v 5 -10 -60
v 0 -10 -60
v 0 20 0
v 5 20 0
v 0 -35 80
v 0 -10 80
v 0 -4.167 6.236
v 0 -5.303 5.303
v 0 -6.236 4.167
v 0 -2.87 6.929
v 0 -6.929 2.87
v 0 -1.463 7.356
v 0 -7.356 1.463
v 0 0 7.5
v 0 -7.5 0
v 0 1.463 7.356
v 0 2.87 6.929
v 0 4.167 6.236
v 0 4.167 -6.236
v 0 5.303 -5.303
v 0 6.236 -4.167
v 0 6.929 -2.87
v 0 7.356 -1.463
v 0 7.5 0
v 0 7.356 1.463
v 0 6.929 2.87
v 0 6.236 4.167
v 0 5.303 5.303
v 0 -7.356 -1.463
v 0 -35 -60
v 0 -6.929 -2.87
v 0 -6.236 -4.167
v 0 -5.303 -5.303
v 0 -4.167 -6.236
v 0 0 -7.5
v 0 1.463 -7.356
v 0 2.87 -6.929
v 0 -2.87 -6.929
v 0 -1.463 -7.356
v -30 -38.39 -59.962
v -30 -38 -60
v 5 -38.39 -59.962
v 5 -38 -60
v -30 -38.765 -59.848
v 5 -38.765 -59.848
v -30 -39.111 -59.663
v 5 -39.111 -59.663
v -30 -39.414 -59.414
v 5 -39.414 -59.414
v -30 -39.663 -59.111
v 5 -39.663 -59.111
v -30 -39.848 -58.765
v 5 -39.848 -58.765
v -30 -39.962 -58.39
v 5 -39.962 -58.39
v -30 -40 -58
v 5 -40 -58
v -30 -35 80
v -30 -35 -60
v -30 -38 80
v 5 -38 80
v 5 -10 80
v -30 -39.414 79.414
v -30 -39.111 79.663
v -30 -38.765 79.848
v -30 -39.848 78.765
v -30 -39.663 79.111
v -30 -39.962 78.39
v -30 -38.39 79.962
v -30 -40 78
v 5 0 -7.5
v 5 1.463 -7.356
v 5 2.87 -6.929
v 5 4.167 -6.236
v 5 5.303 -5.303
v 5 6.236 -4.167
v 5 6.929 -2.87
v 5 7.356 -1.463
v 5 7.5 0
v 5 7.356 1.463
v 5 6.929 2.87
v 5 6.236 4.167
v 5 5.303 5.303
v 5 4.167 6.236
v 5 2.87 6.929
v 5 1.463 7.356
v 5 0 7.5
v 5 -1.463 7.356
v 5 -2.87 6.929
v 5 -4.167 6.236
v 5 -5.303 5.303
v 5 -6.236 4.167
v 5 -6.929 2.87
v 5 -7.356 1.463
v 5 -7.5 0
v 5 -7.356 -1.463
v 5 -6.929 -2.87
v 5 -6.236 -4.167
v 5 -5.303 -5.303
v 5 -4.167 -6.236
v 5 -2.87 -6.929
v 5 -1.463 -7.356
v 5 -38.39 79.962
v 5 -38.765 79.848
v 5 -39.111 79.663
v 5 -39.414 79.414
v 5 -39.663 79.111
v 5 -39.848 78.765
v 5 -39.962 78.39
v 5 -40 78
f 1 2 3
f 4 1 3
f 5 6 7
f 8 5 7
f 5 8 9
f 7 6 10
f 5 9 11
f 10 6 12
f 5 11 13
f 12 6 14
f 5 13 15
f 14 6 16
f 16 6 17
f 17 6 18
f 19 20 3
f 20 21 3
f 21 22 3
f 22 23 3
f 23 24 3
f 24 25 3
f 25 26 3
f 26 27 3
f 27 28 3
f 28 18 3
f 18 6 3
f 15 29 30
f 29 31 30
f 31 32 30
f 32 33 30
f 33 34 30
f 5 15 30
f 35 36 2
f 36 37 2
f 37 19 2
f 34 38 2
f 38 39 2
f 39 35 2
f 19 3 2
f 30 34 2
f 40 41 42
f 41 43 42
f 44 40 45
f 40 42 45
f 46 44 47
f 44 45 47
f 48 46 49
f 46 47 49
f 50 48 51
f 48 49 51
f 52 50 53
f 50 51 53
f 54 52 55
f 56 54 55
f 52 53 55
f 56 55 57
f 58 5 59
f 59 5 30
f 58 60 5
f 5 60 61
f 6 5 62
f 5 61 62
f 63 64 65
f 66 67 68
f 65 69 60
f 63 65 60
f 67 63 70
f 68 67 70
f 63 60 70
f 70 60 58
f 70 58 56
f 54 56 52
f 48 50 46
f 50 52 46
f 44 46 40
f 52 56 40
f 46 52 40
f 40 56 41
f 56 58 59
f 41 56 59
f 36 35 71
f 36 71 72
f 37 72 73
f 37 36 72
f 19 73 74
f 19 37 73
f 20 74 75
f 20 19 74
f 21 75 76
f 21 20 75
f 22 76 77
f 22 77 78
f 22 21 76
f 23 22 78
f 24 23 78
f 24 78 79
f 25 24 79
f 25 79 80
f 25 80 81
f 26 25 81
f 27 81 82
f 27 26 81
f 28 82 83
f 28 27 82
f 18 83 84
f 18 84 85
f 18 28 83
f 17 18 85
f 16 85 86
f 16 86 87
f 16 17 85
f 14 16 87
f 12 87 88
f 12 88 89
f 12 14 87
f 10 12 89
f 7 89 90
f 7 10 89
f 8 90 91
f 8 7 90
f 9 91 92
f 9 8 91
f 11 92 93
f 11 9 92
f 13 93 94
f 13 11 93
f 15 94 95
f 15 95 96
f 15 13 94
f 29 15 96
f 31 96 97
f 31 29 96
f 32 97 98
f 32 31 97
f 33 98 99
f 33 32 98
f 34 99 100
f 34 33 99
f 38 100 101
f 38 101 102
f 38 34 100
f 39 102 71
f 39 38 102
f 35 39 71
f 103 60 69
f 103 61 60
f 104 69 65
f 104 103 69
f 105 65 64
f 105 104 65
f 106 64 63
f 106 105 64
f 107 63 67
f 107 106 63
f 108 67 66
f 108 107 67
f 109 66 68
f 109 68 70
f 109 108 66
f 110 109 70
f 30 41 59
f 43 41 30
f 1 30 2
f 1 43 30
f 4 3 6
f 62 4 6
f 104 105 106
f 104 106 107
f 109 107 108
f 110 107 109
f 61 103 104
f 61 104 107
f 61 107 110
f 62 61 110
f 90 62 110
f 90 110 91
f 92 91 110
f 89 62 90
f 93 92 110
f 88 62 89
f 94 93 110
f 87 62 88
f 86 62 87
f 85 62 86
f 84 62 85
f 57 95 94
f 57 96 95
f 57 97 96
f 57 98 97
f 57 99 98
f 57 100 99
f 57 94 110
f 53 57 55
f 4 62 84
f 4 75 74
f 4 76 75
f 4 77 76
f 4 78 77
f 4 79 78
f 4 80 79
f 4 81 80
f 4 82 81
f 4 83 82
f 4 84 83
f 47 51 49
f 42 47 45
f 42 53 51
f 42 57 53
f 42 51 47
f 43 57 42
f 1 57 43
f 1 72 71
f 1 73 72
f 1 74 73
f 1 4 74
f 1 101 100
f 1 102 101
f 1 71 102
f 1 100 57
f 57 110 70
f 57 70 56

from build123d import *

# Parameters (mm, degrees)
SKETCH1_R           = 7.5
BOSS_EXTRUDE1_DEPTH = 5
SKETCH3_2_W         = 140
SKETCH3_2_H         = 5
BOSS_EXTRUDE3_DEPTH = 35
FILLET1_R           = 2


with BuildPart() as part:
    # Sketch1 → Boss-Extrude1 (new body)
    with BuildSketch(Plane(origin=(0, 0, 0), x_dir=(0, 0, -1), z_dir=(1, 0, 0))):
        Polygon((0, 20), (-80, -10), (-80, -40), (60, -40), (60, -10), align=None)
        Circle(SKETCH1_R, mode=Mode.SUBTRACT)
    extrude(amount=BOSS_EXTRUDE1_DEPTH)

    # Sketch3<2> → Boss-Extrude3 (add)
    with BuildSketch(Plane(origin=(5, 0, 0), x_dir=(0, 0, -1), z_dir=(1, 0, 0))):
        with Locations((-10, -37.5)):
            Rectangle(SKETCH3_2_W, SKETCH3_2_H)
    extrude(amount=-BOSS_EXTRUDE3_DEPTH)

    # Fillet1
    fillet1_edges = [part.edges().sort_by_distance(p)[0] for p in [
        (-12.5, -40, -60),
        (-12.5, -40, 80),
    ]]
    fillet(fillet1_edges, radius=FILLET1_R)


solid = part.part
